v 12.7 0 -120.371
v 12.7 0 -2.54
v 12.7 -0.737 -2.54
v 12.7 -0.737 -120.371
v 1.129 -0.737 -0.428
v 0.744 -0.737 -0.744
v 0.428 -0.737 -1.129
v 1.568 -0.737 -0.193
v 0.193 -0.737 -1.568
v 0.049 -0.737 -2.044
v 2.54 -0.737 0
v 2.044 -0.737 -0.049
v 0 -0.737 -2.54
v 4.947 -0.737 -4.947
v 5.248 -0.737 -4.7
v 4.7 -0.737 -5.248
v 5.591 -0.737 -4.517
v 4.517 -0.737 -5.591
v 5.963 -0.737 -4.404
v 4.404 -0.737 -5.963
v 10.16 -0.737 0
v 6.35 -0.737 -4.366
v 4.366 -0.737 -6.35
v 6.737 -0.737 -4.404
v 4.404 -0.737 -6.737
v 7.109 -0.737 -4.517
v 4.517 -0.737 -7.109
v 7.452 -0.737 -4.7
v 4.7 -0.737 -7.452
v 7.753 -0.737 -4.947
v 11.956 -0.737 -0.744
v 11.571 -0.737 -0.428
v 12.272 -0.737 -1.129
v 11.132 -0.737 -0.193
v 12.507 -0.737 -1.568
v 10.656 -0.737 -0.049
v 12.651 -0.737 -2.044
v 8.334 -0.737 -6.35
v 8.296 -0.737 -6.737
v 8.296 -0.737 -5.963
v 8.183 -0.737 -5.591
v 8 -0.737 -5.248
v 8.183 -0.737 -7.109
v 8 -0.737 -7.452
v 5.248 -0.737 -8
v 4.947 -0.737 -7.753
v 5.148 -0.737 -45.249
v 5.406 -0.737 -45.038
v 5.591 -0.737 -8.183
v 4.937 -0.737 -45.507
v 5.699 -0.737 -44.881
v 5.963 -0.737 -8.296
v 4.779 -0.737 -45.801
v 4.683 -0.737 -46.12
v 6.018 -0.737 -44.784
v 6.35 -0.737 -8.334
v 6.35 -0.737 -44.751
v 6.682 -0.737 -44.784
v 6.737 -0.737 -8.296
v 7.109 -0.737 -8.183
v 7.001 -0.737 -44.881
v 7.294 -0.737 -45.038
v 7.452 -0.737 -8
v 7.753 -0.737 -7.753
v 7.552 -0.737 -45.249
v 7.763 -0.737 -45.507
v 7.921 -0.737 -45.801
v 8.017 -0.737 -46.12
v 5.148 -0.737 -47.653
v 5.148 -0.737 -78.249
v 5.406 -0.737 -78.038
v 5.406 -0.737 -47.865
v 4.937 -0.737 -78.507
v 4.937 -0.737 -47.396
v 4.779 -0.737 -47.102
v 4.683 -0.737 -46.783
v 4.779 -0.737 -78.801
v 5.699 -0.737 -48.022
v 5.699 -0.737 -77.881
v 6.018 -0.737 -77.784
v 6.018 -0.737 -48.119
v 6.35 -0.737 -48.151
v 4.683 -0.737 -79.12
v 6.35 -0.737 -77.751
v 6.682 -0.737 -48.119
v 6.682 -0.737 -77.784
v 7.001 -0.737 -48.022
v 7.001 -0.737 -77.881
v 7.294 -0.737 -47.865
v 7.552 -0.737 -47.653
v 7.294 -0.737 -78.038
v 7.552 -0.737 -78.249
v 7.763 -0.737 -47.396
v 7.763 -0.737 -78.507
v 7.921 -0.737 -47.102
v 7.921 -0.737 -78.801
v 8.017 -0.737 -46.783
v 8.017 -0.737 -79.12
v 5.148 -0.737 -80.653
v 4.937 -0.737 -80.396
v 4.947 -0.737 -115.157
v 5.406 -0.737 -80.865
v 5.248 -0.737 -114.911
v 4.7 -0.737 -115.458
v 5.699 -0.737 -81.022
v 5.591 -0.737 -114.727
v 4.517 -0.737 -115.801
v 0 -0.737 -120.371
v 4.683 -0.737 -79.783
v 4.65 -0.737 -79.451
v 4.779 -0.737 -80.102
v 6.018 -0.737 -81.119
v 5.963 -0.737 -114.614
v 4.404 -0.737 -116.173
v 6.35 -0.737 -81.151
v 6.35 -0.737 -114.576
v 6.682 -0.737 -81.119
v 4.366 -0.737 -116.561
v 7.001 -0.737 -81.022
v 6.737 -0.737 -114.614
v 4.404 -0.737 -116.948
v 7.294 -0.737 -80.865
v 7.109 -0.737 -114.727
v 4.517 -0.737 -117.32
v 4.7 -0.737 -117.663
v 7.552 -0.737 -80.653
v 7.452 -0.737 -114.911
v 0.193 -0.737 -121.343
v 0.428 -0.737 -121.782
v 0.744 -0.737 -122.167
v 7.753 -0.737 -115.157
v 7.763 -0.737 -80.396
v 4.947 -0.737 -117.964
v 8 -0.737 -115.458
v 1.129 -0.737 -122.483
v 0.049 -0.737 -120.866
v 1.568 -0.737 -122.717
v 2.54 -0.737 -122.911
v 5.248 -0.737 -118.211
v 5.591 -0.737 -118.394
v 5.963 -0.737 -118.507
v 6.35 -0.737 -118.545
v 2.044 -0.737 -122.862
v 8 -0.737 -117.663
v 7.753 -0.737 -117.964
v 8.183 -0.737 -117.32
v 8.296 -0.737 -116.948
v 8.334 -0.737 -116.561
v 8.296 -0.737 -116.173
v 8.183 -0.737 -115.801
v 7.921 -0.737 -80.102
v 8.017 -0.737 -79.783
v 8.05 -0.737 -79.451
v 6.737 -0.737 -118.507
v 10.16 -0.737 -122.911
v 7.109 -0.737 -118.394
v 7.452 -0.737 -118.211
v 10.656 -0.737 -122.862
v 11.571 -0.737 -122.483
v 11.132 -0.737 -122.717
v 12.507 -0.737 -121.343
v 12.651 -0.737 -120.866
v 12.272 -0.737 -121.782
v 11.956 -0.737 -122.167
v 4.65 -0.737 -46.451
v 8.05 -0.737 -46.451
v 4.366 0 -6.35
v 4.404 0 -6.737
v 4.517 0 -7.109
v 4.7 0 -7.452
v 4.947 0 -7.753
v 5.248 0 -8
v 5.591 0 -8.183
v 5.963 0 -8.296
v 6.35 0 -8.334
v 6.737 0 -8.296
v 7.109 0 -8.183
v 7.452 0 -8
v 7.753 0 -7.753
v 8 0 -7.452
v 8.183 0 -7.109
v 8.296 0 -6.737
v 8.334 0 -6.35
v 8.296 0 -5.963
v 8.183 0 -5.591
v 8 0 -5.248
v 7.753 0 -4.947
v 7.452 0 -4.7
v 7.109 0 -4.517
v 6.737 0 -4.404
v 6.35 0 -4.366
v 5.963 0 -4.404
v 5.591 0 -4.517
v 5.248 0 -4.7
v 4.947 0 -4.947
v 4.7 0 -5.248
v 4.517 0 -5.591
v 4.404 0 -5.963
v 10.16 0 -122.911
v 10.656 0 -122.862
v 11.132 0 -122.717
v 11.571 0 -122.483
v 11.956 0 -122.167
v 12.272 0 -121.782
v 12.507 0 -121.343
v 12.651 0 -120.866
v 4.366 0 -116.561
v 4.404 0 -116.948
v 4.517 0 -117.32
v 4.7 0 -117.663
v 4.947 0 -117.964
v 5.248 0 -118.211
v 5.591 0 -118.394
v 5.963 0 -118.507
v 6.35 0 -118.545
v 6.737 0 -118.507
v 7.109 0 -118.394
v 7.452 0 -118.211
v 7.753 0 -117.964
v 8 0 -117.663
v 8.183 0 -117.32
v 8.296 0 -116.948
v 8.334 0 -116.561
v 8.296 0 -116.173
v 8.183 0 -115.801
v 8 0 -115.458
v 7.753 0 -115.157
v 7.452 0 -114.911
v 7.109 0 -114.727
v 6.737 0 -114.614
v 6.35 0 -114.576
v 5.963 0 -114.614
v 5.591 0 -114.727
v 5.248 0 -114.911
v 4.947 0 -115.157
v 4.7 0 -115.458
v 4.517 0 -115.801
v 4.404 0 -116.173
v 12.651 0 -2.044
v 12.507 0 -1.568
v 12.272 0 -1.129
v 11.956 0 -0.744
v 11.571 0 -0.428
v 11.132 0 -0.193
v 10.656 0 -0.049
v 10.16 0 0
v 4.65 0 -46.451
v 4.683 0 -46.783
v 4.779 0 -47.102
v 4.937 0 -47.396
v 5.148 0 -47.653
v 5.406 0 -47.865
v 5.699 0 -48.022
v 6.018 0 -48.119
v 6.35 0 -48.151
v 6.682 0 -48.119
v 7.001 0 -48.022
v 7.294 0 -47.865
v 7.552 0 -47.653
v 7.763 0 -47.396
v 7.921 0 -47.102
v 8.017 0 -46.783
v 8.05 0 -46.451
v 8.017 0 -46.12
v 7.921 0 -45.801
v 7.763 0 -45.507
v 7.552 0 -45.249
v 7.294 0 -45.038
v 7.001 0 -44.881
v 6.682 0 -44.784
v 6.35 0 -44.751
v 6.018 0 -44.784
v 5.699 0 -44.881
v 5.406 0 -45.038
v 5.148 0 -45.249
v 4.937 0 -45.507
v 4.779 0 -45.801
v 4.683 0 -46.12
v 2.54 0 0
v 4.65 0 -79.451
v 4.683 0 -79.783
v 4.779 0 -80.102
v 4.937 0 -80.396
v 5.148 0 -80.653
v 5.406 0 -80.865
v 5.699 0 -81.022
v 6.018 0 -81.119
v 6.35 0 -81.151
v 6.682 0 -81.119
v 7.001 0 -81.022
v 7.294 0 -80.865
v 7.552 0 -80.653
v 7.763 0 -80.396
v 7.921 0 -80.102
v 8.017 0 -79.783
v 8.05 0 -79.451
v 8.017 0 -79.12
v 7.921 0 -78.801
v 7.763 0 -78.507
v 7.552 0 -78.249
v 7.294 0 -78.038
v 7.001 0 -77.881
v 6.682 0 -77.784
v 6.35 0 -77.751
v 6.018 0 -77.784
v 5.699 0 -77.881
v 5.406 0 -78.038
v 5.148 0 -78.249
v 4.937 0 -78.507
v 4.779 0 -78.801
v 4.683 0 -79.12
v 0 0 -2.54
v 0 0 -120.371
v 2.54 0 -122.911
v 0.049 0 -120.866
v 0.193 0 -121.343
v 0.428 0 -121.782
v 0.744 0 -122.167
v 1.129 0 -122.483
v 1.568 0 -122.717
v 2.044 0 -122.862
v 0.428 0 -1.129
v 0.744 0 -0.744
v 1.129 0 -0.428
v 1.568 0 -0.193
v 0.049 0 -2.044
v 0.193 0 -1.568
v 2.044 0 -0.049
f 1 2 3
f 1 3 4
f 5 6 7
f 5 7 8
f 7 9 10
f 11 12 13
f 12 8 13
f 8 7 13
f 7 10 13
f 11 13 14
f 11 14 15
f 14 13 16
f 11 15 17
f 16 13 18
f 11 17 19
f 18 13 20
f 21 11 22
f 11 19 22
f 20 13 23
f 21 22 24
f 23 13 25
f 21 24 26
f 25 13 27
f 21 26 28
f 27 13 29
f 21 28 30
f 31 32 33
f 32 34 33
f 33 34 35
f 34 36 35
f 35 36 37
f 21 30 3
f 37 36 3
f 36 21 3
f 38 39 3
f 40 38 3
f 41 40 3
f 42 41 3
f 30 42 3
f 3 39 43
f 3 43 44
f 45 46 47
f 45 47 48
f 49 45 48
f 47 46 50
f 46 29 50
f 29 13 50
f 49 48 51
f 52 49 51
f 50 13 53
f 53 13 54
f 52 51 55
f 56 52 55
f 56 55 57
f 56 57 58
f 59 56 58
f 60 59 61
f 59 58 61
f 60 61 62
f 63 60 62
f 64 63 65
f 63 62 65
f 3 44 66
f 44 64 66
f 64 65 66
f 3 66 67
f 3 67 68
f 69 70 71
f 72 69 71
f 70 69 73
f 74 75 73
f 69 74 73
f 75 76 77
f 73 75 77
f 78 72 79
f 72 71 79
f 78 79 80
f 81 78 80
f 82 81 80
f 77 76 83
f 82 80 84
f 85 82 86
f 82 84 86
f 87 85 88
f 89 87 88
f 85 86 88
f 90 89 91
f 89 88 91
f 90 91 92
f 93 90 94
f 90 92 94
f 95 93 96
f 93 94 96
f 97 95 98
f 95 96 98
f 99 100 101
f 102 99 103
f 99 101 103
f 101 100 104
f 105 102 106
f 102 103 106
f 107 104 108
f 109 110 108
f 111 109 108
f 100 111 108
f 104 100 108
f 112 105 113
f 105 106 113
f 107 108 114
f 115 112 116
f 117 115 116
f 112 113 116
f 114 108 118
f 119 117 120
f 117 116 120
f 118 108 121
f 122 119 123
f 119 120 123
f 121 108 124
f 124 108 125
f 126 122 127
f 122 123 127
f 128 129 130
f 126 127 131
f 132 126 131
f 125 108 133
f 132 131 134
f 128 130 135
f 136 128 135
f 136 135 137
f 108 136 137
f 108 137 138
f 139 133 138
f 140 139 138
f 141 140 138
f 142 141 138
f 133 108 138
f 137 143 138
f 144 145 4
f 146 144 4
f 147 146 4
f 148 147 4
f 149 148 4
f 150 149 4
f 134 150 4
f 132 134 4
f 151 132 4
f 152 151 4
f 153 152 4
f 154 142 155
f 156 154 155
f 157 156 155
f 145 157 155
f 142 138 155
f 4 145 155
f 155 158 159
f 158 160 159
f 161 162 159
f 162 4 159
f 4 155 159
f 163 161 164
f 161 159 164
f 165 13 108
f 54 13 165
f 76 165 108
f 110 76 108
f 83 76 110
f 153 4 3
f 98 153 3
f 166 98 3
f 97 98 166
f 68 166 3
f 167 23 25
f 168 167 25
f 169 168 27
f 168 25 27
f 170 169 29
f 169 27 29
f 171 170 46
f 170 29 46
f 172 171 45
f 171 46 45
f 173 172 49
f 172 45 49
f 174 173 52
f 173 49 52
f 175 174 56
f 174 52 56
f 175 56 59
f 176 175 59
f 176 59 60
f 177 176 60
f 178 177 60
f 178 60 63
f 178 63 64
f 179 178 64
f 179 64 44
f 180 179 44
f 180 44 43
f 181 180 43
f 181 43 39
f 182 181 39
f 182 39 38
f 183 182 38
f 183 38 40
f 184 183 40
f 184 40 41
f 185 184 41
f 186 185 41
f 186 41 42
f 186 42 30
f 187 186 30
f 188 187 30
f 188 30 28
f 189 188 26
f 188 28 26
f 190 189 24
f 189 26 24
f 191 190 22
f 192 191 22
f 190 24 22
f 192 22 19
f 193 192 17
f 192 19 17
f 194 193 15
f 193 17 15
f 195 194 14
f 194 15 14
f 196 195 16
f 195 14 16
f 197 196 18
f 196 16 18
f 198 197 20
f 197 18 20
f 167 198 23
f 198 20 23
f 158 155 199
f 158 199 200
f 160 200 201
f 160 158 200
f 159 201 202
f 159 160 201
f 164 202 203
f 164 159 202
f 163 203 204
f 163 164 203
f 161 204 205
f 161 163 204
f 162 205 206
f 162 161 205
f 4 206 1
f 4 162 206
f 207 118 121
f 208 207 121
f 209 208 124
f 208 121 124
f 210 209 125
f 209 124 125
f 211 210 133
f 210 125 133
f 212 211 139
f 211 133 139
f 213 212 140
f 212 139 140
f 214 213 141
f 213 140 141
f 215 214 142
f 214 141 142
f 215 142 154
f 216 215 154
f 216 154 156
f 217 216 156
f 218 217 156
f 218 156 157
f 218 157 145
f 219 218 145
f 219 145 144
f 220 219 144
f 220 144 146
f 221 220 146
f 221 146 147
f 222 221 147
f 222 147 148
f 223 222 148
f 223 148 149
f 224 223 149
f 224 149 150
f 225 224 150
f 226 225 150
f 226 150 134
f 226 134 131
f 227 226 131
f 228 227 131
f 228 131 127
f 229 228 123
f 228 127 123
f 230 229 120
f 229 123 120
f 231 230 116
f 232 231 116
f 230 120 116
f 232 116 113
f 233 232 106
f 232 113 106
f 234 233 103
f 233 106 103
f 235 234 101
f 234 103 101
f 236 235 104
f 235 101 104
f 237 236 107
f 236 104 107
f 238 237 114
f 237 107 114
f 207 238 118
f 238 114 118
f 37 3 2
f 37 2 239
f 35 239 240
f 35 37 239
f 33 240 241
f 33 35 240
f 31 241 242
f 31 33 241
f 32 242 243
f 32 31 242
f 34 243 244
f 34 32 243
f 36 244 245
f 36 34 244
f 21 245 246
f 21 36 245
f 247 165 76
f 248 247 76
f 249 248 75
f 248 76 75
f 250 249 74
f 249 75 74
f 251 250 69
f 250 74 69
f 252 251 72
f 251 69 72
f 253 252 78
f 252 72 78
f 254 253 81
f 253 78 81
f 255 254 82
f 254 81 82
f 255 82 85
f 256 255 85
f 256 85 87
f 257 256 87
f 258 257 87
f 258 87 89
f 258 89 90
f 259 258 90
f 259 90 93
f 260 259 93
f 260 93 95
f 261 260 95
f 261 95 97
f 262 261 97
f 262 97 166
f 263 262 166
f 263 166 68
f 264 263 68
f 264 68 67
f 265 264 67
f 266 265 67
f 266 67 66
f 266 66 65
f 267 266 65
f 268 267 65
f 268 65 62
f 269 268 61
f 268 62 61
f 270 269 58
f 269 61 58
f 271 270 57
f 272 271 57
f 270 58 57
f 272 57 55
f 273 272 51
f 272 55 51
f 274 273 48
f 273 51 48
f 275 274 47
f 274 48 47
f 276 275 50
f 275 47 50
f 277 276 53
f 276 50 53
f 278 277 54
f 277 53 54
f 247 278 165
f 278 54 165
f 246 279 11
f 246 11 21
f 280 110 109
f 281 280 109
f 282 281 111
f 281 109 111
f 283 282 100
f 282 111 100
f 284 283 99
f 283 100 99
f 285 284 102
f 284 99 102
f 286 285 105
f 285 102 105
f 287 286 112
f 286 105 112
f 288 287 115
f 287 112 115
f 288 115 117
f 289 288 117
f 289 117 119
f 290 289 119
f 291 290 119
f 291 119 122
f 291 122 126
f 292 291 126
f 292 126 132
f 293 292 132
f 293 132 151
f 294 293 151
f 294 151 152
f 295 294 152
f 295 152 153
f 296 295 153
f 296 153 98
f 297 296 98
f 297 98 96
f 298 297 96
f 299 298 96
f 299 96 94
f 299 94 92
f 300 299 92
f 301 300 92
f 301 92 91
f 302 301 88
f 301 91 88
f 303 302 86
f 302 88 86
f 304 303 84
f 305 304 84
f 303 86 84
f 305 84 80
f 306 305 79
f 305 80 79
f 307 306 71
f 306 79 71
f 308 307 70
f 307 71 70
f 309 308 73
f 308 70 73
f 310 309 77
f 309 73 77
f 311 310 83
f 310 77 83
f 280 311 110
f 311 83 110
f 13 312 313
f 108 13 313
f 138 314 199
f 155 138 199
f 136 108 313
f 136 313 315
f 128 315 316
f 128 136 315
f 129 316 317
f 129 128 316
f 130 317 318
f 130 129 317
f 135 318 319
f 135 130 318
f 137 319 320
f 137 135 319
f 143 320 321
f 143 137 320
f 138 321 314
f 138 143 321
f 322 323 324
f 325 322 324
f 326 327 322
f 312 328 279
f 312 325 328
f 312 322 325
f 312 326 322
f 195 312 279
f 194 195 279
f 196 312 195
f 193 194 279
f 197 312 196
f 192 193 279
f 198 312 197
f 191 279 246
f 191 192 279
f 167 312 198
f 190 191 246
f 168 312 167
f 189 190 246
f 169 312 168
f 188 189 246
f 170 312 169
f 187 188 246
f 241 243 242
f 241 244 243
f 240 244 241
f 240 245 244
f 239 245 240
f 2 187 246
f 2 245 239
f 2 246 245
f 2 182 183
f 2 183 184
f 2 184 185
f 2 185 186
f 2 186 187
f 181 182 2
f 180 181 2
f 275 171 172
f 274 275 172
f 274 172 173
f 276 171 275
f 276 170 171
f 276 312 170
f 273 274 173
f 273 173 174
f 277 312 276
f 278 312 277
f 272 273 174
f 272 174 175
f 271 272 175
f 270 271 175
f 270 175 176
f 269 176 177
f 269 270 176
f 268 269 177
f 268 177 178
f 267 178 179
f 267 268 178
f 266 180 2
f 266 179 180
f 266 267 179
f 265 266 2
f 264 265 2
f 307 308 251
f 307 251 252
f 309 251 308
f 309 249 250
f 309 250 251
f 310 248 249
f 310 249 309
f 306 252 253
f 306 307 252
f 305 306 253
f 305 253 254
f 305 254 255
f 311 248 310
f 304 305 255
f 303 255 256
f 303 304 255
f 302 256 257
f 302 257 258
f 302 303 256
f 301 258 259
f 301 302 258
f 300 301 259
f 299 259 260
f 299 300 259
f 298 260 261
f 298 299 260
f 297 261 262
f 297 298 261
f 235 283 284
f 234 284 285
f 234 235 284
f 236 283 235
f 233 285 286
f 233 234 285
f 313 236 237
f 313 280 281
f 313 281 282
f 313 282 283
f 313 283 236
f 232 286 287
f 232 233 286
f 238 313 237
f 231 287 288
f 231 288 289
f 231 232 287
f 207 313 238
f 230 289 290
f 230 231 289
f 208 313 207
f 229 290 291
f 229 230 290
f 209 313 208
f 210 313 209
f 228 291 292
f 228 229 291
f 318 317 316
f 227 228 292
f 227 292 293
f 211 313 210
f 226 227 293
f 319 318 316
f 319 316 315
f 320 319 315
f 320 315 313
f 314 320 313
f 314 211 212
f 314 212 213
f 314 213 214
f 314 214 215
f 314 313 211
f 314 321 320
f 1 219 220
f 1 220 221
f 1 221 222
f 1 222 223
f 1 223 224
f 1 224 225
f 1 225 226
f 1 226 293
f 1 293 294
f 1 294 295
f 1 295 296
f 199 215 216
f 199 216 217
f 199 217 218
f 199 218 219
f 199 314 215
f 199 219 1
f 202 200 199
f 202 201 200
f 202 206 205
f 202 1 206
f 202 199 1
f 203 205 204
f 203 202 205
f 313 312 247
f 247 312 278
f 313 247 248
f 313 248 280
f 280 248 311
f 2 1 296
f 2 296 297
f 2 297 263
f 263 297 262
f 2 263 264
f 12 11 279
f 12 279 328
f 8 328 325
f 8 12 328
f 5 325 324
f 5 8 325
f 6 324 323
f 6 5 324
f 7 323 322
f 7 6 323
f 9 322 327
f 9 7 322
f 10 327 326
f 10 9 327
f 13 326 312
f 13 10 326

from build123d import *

# Parameters (mm, degrees)
SKETCH1_W                       = 12.7
SKETCH1_H                       = 122.9106
BASE_FLANGE2_DEPTH              = 0.7366
M3_CLEARANCE_HOLE1_D            = 3.4
F_5_32_0_15625_DIAMETER_HOLE1_D = 3.96875
BREAK_CORNER1_START             = -0.7366
BREAK_CORNER1_DEPTH             = 0.7366


# Read off the part's stored shape, not the designer's step: Break-Corner1
# Sheet-metal steps are written as plain solids
with BuildPart() as part:
    # Sketch1 → Base-Flange2 (new body)
    with BuildSketch(Plane(origin=(0, 0, 0), x_dir=(1, 0, 0), z_dir=(0, 1, 0))):
        with Locations((6.35, 61.4553)):
            Rectangle(SKETCH1_W, SKETCH1_H)
    extrude(amount=-BASE_FLANGE2_DEPTH)

    # M3 Clearance Hole1 (through all)
    with Locations(Plane(origin=(0, 0, 0), x_dir=(1, 0, 0), z_dir=(0, 1, 0))):
        with Locations((6.35, 46.4512), (6.35, 79.4512)):
            Hole(M3_CLEARANCE_HOLE1_D / 2)

    # 5/32 (0.15625) Diameter Hole1 (through all)
    with Locations(Plane(origin=(0, 0, 0), x_dir=(1, 0, 0), z_dir=(0, 1, 0))):
        with Locations((6.35, 116.5606), (6.35, 6.35)):
            Hole(F_5_32_0_15625_DIAMETER_HOLE1_D / 2)

    # Break-Corner1 outline → Break-Corner1 (cut)
    with BuildSketch(Plane(origin=(0, 0, 0), x_dir=(1, 0, 0), z_dir=(0, 1, 0)).offset(BREAK_CORNER1_START)):
        with BuildLine():
            ThreePointArc((2.54, 0), (0.743948776, 0.743948776), (0, 2.54))
            Line((0, 2.54), (0, 0))
            Line((0, 0), (2.54, 0))
        make_face()
        with BuildLine():
            Line((0, 122.9106), (0, 120.3706))
            ThreePointArc((0, 120.3706), (0.743948776, 122.166651224), (2.54, 122.9106))
            Line((2.54, 122.9106), (0, 122.9106))
        make_face()
        with BuildLine():
            ThreePointArc((12.7, 2.54), (11.956051224, 0.743948776), (10.16, 0))
            Line((10.16, 0), (12.7, 0))
            Line((12.7, 0), (12.7, 2.54))
        make_face()
        with BuildLine():
            Line((12.7, 122.9106), (10.16, 122.9106))
            ThreePointArc((10.16, 122.9106), (11.956051224, 122.166651224), (12.7, 120.3706))
            Line((12.7, 120.3706), (12.7, 122.9106))
        make_face()
    extrude(amount=BREAK_CORNER1_DEPTH, mode=Mode.SUBTRACT)


solid = part.part
